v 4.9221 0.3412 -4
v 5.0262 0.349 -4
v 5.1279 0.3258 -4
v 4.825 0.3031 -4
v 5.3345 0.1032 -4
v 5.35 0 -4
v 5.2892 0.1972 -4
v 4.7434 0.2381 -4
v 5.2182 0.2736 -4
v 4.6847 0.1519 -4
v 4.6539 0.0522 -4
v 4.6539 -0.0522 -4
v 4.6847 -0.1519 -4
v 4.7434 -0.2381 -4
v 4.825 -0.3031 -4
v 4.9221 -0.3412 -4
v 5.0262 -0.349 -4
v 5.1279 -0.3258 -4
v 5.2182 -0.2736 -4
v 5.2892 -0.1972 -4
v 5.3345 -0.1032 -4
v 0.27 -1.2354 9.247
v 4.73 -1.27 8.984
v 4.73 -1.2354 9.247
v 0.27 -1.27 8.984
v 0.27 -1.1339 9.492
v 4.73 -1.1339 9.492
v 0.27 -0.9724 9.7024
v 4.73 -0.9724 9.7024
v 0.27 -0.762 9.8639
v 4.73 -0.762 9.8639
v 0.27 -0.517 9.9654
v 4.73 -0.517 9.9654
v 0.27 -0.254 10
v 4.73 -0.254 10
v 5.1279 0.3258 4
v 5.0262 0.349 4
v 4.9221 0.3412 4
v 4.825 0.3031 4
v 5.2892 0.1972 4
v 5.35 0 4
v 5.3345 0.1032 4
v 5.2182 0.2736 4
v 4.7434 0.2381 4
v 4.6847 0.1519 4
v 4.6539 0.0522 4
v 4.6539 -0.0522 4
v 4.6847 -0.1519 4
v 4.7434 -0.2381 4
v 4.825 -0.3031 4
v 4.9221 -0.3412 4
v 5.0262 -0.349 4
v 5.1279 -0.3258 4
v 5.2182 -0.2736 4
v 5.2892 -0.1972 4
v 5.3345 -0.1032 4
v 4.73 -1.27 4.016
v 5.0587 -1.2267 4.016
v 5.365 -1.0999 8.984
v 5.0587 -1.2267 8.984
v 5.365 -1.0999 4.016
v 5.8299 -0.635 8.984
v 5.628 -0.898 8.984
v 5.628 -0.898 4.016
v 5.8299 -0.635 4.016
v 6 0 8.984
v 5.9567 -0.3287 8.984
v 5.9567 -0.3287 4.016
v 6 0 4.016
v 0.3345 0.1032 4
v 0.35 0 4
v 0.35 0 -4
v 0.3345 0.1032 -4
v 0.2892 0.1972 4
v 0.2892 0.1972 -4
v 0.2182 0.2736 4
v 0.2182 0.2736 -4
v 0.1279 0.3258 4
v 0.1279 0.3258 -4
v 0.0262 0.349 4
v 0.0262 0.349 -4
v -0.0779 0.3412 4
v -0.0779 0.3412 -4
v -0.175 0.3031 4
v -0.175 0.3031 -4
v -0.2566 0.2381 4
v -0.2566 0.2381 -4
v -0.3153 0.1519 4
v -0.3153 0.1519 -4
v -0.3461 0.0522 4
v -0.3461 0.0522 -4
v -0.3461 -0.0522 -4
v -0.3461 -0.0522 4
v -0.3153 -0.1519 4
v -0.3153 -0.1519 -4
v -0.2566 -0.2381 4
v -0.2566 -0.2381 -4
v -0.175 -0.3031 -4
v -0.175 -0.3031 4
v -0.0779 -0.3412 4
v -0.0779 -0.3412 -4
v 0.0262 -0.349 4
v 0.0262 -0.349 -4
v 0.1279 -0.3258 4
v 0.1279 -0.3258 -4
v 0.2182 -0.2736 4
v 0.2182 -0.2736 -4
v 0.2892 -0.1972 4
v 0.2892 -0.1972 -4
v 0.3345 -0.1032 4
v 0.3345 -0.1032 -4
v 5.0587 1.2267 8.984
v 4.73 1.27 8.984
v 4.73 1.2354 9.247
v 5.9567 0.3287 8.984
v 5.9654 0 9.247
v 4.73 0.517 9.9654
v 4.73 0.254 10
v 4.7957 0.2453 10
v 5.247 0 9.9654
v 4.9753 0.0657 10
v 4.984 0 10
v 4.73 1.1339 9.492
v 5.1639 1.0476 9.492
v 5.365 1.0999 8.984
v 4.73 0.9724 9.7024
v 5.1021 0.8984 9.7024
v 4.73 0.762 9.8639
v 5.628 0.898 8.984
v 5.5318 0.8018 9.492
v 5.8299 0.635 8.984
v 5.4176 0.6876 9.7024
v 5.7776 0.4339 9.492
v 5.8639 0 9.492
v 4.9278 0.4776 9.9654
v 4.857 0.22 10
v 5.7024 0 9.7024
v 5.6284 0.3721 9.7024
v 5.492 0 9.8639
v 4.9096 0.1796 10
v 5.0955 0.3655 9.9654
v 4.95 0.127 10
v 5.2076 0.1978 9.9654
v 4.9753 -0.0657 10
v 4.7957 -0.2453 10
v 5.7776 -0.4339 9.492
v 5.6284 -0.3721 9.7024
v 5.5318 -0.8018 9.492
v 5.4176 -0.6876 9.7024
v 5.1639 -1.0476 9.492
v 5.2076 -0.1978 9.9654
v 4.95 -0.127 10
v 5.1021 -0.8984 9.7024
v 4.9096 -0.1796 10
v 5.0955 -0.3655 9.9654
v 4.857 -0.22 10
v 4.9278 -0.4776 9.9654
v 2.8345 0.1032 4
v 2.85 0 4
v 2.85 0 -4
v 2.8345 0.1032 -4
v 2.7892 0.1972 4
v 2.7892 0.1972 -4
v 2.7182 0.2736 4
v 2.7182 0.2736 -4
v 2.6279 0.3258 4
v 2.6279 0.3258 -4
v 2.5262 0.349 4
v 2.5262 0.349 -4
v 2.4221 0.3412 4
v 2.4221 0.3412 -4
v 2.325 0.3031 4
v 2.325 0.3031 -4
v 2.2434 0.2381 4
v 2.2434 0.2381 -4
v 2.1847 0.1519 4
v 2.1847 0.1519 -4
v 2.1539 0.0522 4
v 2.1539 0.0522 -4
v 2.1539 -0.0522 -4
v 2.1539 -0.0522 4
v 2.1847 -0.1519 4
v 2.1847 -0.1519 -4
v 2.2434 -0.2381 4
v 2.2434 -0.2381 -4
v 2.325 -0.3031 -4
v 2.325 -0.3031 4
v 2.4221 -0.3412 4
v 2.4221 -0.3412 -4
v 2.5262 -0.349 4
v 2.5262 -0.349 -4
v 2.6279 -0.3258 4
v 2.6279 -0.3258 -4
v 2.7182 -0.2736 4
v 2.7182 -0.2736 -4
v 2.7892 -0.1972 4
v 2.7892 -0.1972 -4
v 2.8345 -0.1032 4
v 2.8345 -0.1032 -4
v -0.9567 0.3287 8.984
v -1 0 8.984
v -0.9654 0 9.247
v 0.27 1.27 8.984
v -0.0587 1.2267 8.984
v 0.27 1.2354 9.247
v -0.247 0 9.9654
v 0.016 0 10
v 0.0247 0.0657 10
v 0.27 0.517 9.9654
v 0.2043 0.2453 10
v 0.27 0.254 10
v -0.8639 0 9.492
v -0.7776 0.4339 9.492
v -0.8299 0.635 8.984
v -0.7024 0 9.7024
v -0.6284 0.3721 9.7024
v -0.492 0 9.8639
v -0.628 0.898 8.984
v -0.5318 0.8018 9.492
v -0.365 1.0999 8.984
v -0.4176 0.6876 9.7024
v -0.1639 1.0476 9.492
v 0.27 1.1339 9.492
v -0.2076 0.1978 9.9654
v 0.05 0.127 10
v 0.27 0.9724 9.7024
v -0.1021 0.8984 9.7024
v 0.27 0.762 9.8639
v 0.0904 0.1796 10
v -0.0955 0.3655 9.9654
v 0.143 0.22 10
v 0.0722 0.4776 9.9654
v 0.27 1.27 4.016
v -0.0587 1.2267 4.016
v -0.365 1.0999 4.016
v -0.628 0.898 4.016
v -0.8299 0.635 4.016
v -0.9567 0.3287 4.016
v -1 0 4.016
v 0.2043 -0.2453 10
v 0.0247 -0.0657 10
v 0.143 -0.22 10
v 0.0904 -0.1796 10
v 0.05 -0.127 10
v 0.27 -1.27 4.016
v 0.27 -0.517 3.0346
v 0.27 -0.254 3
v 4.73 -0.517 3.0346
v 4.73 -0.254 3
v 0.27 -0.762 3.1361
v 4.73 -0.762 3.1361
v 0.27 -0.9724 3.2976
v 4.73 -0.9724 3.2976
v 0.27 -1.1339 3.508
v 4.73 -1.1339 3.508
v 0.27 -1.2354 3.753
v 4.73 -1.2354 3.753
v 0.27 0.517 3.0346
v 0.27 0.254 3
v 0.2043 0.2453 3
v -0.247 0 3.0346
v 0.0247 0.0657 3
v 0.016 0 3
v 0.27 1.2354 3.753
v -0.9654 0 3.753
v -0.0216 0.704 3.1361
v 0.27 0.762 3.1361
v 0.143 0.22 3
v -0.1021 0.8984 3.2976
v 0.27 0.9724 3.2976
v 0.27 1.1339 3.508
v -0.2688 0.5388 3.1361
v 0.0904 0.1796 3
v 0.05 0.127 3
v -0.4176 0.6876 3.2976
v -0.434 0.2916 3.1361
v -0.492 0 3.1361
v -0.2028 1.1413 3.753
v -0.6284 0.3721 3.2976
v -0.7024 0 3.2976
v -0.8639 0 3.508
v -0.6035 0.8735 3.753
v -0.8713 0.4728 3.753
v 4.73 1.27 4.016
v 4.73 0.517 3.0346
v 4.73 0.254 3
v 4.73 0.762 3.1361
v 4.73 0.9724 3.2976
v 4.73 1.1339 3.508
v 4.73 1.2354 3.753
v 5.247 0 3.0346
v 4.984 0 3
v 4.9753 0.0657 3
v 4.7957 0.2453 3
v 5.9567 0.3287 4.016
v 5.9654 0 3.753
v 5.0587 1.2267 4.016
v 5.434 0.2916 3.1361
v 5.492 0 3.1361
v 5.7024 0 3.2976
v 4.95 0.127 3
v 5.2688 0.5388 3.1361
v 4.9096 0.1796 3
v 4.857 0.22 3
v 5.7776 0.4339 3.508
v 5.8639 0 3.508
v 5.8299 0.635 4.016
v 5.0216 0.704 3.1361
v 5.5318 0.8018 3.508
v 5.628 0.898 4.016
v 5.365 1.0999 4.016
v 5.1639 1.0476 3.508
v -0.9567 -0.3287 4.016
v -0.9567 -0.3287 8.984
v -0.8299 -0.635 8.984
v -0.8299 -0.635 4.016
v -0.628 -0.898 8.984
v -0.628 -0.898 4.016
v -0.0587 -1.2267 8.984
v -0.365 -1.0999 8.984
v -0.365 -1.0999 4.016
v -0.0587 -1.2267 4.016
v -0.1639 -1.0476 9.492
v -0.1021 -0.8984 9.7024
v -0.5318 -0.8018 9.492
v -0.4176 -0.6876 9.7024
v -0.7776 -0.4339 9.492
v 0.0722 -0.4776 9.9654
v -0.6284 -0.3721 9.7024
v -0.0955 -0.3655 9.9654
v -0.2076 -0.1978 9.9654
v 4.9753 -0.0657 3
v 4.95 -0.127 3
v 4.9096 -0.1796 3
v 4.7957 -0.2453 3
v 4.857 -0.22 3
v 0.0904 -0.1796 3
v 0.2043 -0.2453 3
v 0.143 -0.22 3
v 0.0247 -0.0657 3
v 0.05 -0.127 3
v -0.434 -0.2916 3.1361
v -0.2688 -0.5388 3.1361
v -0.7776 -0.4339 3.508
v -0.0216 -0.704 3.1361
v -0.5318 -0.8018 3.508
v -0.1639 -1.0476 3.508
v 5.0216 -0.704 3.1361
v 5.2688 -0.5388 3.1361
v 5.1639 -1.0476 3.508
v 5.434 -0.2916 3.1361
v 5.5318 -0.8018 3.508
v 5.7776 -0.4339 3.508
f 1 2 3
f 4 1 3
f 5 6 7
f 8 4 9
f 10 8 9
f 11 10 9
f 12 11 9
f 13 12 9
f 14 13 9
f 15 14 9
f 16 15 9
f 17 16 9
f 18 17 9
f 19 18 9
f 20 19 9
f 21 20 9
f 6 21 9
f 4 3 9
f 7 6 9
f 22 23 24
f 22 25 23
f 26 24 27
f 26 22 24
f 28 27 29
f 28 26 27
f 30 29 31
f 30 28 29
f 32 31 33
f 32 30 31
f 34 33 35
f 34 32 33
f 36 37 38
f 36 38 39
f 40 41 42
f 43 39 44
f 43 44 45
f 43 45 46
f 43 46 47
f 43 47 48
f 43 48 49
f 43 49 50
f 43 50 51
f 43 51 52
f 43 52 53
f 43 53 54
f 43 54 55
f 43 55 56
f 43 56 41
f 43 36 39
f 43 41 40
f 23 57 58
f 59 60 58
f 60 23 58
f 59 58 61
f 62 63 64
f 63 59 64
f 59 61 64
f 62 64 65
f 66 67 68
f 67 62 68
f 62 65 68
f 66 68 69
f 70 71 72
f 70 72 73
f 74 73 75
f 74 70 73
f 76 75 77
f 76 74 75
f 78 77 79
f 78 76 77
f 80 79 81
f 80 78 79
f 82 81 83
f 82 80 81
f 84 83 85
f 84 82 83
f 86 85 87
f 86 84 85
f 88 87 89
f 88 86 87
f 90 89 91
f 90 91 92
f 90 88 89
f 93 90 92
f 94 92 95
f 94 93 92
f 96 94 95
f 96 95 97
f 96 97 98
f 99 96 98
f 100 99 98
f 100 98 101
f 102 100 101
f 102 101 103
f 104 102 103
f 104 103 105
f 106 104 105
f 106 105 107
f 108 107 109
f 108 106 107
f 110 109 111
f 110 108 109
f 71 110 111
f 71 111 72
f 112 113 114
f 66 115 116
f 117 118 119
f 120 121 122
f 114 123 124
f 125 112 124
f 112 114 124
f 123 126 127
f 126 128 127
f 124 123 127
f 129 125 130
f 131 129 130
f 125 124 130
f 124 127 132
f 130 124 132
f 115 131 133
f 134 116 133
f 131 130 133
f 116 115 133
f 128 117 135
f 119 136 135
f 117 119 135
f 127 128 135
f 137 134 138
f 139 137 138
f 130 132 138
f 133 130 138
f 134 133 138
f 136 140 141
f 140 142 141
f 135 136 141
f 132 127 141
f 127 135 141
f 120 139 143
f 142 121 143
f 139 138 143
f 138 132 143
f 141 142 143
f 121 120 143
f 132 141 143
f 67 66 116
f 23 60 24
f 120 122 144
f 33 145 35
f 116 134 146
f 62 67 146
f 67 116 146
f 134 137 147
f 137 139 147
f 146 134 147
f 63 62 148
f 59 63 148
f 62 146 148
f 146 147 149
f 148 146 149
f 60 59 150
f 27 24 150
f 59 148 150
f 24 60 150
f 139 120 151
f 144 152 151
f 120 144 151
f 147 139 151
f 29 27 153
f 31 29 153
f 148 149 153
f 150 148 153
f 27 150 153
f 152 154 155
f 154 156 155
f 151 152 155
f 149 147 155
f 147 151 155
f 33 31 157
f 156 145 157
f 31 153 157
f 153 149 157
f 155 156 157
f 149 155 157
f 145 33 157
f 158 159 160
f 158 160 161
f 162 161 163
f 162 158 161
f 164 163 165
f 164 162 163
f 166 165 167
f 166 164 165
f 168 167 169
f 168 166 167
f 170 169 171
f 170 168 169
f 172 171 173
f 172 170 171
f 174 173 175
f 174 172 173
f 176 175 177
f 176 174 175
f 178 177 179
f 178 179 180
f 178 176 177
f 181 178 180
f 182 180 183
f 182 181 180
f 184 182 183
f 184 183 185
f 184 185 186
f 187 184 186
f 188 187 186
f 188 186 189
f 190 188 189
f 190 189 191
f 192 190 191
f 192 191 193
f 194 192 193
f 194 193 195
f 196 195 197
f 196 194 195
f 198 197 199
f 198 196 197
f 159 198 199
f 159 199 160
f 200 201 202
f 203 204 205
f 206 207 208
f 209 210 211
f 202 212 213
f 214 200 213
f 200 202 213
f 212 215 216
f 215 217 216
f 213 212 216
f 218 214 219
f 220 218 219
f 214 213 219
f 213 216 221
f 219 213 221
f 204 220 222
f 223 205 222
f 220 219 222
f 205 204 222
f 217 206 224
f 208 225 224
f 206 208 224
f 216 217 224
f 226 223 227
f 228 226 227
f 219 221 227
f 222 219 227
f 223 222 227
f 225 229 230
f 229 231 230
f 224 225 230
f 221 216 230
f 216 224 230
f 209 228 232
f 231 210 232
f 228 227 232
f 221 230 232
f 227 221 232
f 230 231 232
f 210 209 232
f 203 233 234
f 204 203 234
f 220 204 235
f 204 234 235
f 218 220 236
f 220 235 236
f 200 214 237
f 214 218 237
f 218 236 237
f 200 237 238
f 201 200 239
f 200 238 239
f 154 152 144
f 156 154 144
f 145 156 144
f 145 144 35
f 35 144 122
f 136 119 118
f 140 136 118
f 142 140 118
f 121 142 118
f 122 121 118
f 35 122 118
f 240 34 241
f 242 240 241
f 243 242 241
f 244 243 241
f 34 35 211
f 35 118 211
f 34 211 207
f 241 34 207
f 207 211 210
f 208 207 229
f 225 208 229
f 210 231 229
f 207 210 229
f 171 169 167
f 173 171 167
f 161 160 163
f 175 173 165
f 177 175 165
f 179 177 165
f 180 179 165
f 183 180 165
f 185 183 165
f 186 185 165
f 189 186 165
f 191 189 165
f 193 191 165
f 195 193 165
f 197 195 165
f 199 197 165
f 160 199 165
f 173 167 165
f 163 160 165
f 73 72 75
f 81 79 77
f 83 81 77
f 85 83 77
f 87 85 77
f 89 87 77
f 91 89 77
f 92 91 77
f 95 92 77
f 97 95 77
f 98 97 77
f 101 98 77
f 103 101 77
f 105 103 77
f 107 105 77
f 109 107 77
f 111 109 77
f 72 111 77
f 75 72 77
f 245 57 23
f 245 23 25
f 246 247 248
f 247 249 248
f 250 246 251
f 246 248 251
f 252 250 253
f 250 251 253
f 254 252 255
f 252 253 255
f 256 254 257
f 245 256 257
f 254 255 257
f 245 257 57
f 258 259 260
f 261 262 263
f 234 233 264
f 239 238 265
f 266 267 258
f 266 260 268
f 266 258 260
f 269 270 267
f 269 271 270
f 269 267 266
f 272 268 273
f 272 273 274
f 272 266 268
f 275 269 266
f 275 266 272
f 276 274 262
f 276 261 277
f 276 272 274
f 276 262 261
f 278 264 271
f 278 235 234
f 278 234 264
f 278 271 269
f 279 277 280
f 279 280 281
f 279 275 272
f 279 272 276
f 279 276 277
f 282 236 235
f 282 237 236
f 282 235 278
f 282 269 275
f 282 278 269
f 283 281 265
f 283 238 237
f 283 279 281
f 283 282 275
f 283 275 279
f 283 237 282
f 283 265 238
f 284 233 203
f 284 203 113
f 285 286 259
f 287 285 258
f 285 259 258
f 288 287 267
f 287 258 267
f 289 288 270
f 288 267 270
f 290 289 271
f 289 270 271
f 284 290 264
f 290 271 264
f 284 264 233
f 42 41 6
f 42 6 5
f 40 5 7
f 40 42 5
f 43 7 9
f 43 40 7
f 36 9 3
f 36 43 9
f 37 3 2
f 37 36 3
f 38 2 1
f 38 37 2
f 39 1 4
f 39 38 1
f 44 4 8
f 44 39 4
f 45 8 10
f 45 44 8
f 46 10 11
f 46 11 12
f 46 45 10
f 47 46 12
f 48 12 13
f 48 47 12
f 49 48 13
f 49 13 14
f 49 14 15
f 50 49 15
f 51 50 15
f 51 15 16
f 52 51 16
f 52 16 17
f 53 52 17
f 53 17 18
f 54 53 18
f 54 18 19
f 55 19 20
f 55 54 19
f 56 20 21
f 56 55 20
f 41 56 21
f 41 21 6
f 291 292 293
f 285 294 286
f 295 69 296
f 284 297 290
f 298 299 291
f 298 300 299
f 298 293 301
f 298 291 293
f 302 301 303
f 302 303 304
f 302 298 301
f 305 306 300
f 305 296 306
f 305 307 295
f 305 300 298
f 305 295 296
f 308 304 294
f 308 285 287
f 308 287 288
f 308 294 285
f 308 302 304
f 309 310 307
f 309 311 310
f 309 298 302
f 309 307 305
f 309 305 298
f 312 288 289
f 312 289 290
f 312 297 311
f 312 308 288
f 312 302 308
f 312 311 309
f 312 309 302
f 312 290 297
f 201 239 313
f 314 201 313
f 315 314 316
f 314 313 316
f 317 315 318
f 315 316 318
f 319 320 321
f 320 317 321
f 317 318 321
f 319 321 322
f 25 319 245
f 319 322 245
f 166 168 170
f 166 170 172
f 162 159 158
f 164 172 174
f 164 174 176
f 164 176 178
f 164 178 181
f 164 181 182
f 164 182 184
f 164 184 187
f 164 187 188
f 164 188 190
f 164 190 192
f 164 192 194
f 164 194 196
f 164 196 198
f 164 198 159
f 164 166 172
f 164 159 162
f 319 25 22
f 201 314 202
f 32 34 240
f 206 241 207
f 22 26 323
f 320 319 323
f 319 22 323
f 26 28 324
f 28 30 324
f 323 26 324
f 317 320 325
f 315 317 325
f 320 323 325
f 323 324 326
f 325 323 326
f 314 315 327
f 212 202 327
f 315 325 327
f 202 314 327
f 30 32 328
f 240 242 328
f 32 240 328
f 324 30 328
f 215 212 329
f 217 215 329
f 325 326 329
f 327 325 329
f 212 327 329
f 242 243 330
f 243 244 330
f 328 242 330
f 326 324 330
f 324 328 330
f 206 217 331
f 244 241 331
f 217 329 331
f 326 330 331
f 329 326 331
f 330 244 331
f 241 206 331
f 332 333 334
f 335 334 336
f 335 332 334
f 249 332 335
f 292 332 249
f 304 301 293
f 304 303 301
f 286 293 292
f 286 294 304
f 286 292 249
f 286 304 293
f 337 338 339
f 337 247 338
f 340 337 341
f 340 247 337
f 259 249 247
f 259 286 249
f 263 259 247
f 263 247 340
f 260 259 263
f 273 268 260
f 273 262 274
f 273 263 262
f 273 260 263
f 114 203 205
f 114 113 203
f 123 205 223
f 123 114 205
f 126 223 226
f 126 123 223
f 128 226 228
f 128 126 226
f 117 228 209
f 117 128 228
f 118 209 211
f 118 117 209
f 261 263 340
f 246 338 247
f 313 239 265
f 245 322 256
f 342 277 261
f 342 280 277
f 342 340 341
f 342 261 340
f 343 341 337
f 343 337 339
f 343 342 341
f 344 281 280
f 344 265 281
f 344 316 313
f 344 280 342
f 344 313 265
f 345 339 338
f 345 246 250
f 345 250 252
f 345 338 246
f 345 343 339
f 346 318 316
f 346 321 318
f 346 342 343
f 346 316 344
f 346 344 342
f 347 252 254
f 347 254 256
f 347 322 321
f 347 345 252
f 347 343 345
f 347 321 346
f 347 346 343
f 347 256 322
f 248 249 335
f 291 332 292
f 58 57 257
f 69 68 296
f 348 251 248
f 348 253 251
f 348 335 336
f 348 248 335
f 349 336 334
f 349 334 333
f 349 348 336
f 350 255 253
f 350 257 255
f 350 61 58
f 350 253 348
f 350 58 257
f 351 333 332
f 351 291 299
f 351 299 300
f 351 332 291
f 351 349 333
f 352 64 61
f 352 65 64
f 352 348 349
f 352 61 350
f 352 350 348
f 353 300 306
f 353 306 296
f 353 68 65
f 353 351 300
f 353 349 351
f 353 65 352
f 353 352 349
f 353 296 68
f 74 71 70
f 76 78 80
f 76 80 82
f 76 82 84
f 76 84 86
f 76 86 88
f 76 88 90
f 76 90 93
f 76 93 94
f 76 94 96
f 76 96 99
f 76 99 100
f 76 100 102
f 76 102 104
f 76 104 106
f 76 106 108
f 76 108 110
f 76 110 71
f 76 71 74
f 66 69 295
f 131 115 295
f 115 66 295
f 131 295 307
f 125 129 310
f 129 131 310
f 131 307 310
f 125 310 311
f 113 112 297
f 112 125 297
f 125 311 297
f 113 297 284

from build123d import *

# Parameters (mm, degrees)
SKETCH_R     = 0.35
PAD_DEPTH    = 8
PAD002_DEPTH = 7
FILLET_R     = 1.016
FILLET001_R  = 1.016


with BuildPart() as pad:
    # Sketch → Pad (new body)
    with BuildSketch(Plane.XY.offset(4)):
        Circle(SKETCH_R)
        with Locations((5, 0)):
            Circle(SKETCH_R)
        with Locations((2.5, 0)):
            Circle(SKETCH_R)
    extrude(amount=-PAD_DEPTH)


with BuildPart() as fillet001:
    # Sketch003 → Pad002 (new body)
    with BuildSketch(Plane.XY.offset(3)):
        with BuildLine():
            Line((0.27, 1.27), (4.73, 1.27))
            ThreePointArc((6, 0), (5.628026, 0.898026), (4.73, 1.27))
            ThreePointArc((4.73, -1.27), (5.628026, -0.898026), (6, 0))
            Line((4.73, -1.27), (0.27, -1.27))
            ThreePointArc((-1, 0), (-0.628026, -0.898026), (0.27, -1.27))
            ThreePointArc((0.27, 1.27), (-0.628026, 0.898026), (-1, 0))
        make_face()
    extrude(amount=PAD002_DEPTH)

    # Fillet
    fillet_edges = [fillet001.edges().sort_by_distance(p)[0] for p in [
        (2.5, 1.27, 10),
        (-0.628026, 0.898026, 10),
        (-0.628026, -0.898026, 10),
        (2.5, -1.27, 10),
        (5.628026, -0.898026, 10),
        (5.628026, 0.898026, 10),
    ]]
    fillet(fillet_edges, radius=FILLET_R)

    # Fillet001
    fillet001_edges = [fillet001.edges().sort_by_distance(p)[0] for p in [
        (5.628026, -0.898026, 3),
        (5.628026, 0.898026, 3),
        (2.5, 1.27, 3),
        (2.5, -1.27, 3),
        (-0.628026, -0.898026, 3),
        (-0.628026, 0.898026, 3),
    ]]
    fillet(fillet001_edges, radius=FILLET001_R)


solid = Compound([pad.part, fillet001.part])
